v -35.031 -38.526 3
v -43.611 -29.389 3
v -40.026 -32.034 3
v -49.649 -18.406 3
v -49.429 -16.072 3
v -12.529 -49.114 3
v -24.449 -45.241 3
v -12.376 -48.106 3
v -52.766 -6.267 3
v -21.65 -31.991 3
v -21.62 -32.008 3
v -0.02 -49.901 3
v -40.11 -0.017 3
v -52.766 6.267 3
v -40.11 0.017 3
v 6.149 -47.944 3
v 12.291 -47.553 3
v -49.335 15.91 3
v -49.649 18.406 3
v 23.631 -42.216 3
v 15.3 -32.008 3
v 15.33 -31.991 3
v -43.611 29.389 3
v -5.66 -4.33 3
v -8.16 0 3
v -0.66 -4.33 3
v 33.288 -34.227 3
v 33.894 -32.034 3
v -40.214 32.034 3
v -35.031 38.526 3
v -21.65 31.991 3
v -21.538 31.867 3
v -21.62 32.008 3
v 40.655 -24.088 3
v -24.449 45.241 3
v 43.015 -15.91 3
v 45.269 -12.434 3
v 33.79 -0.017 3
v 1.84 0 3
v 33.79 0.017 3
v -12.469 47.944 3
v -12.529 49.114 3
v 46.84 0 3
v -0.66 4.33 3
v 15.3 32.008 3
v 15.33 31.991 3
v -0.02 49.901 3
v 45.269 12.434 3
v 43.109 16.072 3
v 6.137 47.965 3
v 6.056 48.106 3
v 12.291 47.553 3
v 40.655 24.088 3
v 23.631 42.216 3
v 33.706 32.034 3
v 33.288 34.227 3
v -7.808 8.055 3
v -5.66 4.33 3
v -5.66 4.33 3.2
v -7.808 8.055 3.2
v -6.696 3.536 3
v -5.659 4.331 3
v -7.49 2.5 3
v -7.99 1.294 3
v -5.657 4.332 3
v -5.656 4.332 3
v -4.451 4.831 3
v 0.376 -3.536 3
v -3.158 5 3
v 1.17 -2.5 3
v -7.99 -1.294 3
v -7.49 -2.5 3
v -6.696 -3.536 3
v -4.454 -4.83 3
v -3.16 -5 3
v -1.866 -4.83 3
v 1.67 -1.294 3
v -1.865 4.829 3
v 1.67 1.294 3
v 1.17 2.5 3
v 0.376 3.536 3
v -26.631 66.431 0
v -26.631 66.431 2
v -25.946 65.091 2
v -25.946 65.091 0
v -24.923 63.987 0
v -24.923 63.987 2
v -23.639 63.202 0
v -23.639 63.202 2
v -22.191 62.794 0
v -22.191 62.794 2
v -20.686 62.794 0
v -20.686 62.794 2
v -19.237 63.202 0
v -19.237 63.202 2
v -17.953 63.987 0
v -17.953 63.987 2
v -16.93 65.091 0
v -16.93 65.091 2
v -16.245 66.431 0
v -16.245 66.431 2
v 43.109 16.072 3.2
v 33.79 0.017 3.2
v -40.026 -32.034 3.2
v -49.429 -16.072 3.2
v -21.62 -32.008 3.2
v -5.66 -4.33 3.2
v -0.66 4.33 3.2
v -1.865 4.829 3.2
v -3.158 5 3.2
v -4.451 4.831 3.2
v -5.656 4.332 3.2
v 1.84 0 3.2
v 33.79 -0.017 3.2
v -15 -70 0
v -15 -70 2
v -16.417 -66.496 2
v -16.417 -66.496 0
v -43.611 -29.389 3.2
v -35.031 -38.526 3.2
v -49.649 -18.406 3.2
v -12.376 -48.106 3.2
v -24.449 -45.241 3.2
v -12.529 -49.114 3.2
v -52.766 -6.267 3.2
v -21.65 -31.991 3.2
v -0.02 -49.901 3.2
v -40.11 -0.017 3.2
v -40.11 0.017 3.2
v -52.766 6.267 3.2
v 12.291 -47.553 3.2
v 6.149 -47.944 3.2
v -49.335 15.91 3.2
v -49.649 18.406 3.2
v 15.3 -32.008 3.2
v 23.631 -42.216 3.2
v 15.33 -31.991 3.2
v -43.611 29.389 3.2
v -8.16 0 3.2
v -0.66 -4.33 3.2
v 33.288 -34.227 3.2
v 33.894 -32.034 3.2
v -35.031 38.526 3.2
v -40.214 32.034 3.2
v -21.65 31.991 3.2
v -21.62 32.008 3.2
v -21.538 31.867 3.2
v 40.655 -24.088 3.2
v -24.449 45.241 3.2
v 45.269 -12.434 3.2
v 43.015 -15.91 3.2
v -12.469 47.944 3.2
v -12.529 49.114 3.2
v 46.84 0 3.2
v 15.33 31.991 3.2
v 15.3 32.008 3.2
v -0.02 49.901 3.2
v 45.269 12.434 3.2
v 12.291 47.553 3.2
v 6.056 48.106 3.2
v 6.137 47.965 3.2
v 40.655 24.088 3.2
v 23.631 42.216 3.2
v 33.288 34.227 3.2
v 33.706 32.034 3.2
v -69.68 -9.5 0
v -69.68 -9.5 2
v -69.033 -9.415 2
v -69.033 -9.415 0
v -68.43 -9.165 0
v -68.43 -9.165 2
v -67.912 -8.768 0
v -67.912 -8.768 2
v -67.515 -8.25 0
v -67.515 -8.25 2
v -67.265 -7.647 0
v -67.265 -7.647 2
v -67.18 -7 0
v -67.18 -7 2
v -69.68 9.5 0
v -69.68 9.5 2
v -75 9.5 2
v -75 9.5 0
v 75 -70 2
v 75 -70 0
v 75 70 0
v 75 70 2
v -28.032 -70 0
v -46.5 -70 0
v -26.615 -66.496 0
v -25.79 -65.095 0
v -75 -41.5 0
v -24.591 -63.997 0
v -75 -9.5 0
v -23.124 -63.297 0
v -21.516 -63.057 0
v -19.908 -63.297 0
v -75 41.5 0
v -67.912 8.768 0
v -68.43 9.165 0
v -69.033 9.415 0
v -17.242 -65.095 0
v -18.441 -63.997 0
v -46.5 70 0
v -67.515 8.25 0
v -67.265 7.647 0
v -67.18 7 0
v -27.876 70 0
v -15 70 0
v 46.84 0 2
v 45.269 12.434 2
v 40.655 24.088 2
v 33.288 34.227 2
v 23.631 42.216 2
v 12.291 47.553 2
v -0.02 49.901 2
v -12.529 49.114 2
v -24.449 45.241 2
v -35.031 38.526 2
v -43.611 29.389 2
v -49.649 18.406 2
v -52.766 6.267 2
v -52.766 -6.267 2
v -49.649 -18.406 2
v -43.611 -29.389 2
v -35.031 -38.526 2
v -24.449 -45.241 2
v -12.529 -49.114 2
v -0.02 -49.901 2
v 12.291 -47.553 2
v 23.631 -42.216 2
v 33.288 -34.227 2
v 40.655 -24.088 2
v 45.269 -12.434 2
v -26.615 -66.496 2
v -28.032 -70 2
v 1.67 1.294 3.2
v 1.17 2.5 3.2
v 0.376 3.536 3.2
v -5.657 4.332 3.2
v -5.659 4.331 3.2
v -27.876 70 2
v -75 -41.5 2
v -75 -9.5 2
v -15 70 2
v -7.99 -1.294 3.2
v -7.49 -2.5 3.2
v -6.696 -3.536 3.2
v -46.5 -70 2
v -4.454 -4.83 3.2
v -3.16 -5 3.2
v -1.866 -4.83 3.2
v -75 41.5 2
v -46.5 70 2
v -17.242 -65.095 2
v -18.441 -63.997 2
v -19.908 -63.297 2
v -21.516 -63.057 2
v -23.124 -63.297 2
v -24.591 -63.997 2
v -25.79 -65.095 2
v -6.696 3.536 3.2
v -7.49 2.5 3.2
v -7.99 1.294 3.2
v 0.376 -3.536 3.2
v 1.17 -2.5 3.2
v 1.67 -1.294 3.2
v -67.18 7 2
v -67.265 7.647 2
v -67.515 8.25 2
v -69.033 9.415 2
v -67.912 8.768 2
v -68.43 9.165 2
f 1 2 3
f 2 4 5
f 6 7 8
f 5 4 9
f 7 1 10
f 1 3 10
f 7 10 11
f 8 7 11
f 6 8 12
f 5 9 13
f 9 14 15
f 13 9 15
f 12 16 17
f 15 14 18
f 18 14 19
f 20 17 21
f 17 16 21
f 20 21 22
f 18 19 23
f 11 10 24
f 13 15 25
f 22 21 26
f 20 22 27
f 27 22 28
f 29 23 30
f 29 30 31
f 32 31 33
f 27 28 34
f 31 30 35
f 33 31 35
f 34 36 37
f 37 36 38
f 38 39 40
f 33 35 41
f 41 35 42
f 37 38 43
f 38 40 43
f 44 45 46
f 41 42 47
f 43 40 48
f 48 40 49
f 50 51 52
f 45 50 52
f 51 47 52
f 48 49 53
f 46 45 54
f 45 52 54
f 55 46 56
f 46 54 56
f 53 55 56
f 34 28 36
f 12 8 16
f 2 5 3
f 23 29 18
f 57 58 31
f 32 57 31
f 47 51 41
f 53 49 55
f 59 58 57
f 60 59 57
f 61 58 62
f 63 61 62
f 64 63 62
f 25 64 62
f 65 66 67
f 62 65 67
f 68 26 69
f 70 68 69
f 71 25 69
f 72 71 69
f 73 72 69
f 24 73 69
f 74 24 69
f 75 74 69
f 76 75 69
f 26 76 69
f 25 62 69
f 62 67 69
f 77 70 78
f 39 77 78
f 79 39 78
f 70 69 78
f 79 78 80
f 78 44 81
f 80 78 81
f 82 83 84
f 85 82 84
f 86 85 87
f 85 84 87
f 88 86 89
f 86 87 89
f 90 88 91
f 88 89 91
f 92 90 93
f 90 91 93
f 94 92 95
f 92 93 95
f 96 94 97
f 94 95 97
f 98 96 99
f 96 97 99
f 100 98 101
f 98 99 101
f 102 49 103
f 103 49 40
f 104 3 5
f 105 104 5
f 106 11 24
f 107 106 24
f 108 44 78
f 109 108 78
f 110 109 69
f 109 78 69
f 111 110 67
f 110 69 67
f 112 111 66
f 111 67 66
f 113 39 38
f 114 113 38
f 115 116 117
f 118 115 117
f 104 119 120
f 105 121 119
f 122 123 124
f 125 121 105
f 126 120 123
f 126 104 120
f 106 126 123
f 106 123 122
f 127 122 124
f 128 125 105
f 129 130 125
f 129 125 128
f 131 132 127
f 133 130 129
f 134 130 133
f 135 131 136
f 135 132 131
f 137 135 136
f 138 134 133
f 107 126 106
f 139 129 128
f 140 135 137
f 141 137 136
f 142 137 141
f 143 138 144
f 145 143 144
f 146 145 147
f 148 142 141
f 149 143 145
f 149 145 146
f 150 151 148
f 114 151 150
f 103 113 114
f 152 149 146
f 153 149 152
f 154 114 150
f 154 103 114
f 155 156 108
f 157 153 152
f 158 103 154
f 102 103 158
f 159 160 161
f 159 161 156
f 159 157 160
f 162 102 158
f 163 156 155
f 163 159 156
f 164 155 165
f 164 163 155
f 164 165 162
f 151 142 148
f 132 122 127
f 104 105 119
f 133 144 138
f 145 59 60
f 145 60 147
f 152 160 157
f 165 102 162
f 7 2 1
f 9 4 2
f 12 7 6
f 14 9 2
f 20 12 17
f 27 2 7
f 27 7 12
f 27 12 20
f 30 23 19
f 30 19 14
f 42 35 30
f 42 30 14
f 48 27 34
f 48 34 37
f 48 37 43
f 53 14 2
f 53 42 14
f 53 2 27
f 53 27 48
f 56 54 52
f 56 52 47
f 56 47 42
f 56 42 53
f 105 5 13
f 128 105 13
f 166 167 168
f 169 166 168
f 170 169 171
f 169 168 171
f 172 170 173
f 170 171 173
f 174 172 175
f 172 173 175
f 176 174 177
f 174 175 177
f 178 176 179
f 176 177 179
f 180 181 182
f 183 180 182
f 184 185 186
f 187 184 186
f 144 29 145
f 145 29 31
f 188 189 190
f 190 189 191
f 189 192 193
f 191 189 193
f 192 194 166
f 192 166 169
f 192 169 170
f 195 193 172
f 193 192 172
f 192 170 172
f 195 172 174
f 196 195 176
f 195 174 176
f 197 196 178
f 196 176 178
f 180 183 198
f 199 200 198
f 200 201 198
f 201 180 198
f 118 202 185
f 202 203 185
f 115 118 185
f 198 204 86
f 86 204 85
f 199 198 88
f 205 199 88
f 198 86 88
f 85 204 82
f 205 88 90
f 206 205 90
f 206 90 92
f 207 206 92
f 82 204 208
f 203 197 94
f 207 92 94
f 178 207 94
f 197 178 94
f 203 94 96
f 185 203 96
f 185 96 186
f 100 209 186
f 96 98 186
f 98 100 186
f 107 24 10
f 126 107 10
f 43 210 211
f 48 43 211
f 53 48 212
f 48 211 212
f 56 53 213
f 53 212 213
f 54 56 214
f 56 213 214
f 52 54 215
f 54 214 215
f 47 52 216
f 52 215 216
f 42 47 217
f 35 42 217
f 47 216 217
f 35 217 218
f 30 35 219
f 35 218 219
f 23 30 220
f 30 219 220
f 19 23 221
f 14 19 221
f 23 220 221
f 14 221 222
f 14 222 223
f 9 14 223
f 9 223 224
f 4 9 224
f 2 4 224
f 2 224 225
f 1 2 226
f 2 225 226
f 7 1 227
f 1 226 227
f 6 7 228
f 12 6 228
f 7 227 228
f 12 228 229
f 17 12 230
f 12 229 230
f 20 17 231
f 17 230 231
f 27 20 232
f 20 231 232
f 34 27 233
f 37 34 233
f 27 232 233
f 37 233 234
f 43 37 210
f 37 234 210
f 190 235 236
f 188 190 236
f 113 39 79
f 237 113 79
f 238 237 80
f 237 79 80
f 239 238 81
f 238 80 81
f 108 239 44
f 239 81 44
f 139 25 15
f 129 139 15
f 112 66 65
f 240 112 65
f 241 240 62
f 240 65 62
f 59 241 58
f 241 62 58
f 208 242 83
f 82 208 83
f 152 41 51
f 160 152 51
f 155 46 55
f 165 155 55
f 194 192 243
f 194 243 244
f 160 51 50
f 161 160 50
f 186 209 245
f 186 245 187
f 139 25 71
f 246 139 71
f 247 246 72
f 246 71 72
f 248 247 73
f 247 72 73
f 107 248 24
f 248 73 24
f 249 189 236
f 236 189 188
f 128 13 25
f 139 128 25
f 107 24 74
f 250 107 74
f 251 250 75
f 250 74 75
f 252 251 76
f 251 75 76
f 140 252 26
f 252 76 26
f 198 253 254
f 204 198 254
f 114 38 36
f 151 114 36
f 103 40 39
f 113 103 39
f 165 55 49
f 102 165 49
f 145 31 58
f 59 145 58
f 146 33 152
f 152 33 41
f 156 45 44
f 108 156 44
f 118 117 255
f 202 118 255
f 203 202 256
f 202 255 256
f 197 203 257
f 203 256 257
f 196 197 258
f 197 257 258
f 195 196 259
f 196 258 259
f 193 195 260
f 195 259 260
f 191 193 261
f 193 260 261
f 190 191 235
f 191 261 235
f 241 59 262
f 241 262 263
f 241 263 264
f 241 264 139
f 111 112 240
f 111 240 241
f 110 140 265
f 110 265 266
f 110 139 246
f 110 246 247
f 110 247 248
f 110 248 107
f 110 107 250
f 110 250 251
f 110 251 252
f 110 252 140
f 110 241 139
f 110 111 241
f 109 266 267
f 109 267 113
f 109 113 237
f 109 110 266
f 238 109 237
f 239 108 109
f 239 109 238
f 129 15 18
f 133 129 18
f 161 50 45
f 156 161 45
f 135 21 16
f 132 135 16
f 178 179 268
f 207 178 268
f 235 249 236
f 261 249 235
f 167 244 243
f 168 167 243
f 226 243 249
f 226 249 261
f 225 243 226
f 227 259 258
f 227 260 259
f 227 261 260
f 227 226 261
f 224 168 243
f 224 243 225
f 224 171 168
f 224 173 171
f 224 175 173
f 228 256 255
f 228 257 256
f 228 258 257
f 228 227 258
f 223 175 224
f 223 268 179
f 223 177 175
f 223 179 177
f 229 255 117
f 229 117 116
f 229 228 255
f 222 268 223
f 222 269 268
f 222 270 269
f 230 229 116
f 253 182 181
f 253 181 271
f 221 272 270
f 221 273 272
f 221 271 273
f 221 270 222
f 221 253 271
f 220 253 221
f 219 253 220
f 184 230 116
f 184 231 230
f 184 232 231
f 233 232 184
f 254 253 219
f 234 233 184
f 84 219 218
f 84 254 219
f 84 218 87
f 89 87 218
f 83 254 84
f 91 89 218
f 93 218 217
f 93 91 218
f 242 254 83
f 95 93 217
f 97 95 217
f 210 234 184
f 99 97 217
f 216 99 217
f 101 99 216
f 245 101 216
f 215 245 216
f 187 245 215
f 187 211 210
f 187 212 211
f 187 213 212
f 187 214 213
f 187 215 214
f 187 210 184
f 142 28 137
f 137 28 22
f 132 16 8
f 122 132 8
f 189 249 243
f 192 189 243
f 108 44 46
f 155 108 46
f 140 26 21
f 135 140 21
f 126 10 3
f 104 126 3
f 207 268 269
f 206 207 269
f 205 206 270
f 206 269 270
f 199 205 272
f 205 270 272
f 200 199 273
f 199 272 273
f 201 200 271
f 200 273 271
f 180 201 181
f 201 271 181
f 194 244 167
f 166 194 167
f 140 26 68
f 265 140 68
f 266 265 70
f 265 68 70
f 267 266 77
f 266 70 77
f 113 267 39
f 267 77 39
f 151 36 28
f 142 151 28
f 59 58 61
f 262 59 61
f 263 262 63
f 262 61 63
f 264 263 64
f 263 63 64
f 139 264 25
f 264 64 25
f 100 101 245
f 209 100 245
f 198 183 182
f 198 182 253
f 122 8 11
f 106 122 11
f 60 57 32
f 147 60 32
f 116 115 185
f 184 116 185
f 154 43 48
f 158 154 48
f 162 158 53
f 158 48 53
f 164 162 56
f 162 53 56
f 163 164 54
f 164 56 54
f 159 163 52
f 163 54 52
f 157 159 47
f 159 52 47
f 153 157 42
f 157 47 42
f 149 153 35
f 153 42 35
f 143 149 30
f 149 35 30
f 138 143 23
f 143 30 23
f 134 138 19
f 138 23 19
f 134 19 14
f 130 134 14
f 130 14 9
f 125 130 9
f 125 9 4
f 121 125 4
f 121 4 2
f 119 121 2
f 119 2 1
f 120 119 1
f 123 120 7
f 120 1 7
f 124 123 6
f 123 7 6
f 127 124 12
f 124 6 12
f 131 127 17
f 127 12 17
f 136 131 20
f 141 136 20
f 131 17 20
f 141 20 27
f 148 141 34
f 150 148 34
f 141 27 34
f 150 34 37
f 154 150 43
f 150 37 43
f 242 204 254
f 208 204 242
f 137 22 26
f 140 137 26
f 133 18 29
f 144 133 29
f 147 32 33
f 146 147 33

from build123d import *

# Parameters (mm, degrees)
F0_W      = 150
F0_H      = 140
F1_DEPTH  = 2
F3_DEPTH  = 2.001
F5_DEPTH  = 2.001
F7_DEPTH  = 2.001
F8_R      = 50
F9_DEPTH  = 1
F10_R     = 50
F11_DEPTH = 0.2


with BuildPart() as f1:
    # F0 (on Top) → F1 (new body)
    with BuildSketch(Plane.XY):
        Rectangle(F0_W, F0_H)
    extrude(amount=F1_DEPTH)

    # F2 (on face) → F3 (cut, through all)
    with BuildSketch(Plane.XY.offset(2)):
        Polygon((-75, 70), (-75, 41.5), (-46.5, 70), align=None)
        Polygon((-46.5, -70), (-75, -41.5), (-75, -70), align=None)
    extrude(amount=-F3_DEPTH, mode=Mode.SUBTRACT)

    # F4 (on face) → F5 (cut, through all)
    with BuildSketch(Plane.XY.offset(2)):
        with BuildLine():
            Line((-69.68, 9.5), (-75, 9.5))
            Line((-75, 9.5), (-75, -9.5))
            Line((-75, -9.5), (-69.68, -9.5))
            ThreePointArc((-69.68, -9.5), (-67.912233, -8.767767), (-67.18, -7))
            Line((-67.18, -7), (-67.18, 7))
            ThreePointArc((-67.18, 7), (-67.912233, 8.767767), (-69.68, 9.5))
        make_face()
    extrude(amount=-F5_DEPTH, mode=Mode.SUBTRACT)

    # F6 (on face) → F7 (cut, through all)
    with BuildSketch(Plane.XY.offset(2)):
        with BuildLine():
            Line((-28.031671, -70), (-15, -70))
            Line((-15, -70), (-16.416769, -66.495551))
            ThreePointArc((-16.416769, -66.495551), (-21.515836, -63.056988), (-26.614902, -66.495551))
            Line((-26.614902, -66.495551), (-28.031671, -70))
        make_face()
        with BuildLine():
            Line((-27.876137, 70), (-26.631231, 66.430881))
            ThreePointArc((-26.631231, 66.430881), (-21.438069, 62.742254), (-16.244907, 66.430881))
            Line((-16.244907, 66.430881), (-15, 70))
            Line((-15, 70), (-27.876137, 70))
        make_face()
    extrude(amount=-F7_DEPTH, mode=Mode.SUBTRACT)

    # F8 (on face) → F9 (join)
    with BuildSketch(Plane.XY.offset(2)):
        with Locations((-3.16, 0)):
            Circle(F8_R)
    extrude(amount=F9_DEPTH)


with BuildPart() as f11:
    # F10 (on face) → F11 (new body)
    with BuildSketch(Plane.XY.offset(3)):
        with Locations((-3.16, 0)):
            Circle(F10_R)
        Polygon((33.789995, 0.0174), (1.84, 0), (33.789995, -0.0174), (43.014893, -15.909946), (33.89353, -32.034094), (15.330067, -31.990934), (-0.66, -4.330127), (15.299929, -32.008335), (6.149029, -47.943603), (-12.375574, -48.106345), (-21.619929, -32.008335), (-5.66, -4.330127), (-21.650067, -31.990934), (-40.025864, -32.033657), (-49.429104, -16.072251), (-40.109995, -0.0174), (-8.16, 0), (-40.109995, 0.0174), (-49.334893, 15.909946), (-40.21353, 32.034094), (-21.650067, 31.990934), (-5.66, 4.330127), (-7.807768, 8.054854), (-21.538334, 31.86683), (-21.619929, 32.008335), (-12.469029, 47.943603), (6.055574, 48.106345), (6.137001, 47.964549), (15.299929, 32.008335), (-0.66, 4.330127), (15.330067, 31.990934), (33.705864, 32.033657), (43.109104, 16.072251), align=None, mode=Mode.SUBTRACT)
        with BuildLine():
            ThreePointArc((-0.66, -4.330127), (1.170127, -2.5), (1.84, 0))
            ThreePointArc((1.84, 0), (1.170127, 2.5), (-0.66, 4.330127))
            ThreePointArc((-0.66, 4.330127), (-3.157658, 4.999999), (-5.655943, 4.332467))
            ThreePointArc((-5.655943, 4.332467), (-5.657972, 4.331297), (-5.66, 4.330127))
            ThreePointArc((-5.66, 4.330127), (-7.490127, 2.5), (-8.16, 0))
            ThreePointArc((-8.16, 0), (-7.490127, -2.5), (-5.66, -4.330127))
            ThreePointArc((-5.66, -4.330127), (-3.16, -5), (-0.66, -4.330127))
        make_face()
    extrude(amount=F11_DEPTH)


solid = Compound([f1.part, f11.part])
